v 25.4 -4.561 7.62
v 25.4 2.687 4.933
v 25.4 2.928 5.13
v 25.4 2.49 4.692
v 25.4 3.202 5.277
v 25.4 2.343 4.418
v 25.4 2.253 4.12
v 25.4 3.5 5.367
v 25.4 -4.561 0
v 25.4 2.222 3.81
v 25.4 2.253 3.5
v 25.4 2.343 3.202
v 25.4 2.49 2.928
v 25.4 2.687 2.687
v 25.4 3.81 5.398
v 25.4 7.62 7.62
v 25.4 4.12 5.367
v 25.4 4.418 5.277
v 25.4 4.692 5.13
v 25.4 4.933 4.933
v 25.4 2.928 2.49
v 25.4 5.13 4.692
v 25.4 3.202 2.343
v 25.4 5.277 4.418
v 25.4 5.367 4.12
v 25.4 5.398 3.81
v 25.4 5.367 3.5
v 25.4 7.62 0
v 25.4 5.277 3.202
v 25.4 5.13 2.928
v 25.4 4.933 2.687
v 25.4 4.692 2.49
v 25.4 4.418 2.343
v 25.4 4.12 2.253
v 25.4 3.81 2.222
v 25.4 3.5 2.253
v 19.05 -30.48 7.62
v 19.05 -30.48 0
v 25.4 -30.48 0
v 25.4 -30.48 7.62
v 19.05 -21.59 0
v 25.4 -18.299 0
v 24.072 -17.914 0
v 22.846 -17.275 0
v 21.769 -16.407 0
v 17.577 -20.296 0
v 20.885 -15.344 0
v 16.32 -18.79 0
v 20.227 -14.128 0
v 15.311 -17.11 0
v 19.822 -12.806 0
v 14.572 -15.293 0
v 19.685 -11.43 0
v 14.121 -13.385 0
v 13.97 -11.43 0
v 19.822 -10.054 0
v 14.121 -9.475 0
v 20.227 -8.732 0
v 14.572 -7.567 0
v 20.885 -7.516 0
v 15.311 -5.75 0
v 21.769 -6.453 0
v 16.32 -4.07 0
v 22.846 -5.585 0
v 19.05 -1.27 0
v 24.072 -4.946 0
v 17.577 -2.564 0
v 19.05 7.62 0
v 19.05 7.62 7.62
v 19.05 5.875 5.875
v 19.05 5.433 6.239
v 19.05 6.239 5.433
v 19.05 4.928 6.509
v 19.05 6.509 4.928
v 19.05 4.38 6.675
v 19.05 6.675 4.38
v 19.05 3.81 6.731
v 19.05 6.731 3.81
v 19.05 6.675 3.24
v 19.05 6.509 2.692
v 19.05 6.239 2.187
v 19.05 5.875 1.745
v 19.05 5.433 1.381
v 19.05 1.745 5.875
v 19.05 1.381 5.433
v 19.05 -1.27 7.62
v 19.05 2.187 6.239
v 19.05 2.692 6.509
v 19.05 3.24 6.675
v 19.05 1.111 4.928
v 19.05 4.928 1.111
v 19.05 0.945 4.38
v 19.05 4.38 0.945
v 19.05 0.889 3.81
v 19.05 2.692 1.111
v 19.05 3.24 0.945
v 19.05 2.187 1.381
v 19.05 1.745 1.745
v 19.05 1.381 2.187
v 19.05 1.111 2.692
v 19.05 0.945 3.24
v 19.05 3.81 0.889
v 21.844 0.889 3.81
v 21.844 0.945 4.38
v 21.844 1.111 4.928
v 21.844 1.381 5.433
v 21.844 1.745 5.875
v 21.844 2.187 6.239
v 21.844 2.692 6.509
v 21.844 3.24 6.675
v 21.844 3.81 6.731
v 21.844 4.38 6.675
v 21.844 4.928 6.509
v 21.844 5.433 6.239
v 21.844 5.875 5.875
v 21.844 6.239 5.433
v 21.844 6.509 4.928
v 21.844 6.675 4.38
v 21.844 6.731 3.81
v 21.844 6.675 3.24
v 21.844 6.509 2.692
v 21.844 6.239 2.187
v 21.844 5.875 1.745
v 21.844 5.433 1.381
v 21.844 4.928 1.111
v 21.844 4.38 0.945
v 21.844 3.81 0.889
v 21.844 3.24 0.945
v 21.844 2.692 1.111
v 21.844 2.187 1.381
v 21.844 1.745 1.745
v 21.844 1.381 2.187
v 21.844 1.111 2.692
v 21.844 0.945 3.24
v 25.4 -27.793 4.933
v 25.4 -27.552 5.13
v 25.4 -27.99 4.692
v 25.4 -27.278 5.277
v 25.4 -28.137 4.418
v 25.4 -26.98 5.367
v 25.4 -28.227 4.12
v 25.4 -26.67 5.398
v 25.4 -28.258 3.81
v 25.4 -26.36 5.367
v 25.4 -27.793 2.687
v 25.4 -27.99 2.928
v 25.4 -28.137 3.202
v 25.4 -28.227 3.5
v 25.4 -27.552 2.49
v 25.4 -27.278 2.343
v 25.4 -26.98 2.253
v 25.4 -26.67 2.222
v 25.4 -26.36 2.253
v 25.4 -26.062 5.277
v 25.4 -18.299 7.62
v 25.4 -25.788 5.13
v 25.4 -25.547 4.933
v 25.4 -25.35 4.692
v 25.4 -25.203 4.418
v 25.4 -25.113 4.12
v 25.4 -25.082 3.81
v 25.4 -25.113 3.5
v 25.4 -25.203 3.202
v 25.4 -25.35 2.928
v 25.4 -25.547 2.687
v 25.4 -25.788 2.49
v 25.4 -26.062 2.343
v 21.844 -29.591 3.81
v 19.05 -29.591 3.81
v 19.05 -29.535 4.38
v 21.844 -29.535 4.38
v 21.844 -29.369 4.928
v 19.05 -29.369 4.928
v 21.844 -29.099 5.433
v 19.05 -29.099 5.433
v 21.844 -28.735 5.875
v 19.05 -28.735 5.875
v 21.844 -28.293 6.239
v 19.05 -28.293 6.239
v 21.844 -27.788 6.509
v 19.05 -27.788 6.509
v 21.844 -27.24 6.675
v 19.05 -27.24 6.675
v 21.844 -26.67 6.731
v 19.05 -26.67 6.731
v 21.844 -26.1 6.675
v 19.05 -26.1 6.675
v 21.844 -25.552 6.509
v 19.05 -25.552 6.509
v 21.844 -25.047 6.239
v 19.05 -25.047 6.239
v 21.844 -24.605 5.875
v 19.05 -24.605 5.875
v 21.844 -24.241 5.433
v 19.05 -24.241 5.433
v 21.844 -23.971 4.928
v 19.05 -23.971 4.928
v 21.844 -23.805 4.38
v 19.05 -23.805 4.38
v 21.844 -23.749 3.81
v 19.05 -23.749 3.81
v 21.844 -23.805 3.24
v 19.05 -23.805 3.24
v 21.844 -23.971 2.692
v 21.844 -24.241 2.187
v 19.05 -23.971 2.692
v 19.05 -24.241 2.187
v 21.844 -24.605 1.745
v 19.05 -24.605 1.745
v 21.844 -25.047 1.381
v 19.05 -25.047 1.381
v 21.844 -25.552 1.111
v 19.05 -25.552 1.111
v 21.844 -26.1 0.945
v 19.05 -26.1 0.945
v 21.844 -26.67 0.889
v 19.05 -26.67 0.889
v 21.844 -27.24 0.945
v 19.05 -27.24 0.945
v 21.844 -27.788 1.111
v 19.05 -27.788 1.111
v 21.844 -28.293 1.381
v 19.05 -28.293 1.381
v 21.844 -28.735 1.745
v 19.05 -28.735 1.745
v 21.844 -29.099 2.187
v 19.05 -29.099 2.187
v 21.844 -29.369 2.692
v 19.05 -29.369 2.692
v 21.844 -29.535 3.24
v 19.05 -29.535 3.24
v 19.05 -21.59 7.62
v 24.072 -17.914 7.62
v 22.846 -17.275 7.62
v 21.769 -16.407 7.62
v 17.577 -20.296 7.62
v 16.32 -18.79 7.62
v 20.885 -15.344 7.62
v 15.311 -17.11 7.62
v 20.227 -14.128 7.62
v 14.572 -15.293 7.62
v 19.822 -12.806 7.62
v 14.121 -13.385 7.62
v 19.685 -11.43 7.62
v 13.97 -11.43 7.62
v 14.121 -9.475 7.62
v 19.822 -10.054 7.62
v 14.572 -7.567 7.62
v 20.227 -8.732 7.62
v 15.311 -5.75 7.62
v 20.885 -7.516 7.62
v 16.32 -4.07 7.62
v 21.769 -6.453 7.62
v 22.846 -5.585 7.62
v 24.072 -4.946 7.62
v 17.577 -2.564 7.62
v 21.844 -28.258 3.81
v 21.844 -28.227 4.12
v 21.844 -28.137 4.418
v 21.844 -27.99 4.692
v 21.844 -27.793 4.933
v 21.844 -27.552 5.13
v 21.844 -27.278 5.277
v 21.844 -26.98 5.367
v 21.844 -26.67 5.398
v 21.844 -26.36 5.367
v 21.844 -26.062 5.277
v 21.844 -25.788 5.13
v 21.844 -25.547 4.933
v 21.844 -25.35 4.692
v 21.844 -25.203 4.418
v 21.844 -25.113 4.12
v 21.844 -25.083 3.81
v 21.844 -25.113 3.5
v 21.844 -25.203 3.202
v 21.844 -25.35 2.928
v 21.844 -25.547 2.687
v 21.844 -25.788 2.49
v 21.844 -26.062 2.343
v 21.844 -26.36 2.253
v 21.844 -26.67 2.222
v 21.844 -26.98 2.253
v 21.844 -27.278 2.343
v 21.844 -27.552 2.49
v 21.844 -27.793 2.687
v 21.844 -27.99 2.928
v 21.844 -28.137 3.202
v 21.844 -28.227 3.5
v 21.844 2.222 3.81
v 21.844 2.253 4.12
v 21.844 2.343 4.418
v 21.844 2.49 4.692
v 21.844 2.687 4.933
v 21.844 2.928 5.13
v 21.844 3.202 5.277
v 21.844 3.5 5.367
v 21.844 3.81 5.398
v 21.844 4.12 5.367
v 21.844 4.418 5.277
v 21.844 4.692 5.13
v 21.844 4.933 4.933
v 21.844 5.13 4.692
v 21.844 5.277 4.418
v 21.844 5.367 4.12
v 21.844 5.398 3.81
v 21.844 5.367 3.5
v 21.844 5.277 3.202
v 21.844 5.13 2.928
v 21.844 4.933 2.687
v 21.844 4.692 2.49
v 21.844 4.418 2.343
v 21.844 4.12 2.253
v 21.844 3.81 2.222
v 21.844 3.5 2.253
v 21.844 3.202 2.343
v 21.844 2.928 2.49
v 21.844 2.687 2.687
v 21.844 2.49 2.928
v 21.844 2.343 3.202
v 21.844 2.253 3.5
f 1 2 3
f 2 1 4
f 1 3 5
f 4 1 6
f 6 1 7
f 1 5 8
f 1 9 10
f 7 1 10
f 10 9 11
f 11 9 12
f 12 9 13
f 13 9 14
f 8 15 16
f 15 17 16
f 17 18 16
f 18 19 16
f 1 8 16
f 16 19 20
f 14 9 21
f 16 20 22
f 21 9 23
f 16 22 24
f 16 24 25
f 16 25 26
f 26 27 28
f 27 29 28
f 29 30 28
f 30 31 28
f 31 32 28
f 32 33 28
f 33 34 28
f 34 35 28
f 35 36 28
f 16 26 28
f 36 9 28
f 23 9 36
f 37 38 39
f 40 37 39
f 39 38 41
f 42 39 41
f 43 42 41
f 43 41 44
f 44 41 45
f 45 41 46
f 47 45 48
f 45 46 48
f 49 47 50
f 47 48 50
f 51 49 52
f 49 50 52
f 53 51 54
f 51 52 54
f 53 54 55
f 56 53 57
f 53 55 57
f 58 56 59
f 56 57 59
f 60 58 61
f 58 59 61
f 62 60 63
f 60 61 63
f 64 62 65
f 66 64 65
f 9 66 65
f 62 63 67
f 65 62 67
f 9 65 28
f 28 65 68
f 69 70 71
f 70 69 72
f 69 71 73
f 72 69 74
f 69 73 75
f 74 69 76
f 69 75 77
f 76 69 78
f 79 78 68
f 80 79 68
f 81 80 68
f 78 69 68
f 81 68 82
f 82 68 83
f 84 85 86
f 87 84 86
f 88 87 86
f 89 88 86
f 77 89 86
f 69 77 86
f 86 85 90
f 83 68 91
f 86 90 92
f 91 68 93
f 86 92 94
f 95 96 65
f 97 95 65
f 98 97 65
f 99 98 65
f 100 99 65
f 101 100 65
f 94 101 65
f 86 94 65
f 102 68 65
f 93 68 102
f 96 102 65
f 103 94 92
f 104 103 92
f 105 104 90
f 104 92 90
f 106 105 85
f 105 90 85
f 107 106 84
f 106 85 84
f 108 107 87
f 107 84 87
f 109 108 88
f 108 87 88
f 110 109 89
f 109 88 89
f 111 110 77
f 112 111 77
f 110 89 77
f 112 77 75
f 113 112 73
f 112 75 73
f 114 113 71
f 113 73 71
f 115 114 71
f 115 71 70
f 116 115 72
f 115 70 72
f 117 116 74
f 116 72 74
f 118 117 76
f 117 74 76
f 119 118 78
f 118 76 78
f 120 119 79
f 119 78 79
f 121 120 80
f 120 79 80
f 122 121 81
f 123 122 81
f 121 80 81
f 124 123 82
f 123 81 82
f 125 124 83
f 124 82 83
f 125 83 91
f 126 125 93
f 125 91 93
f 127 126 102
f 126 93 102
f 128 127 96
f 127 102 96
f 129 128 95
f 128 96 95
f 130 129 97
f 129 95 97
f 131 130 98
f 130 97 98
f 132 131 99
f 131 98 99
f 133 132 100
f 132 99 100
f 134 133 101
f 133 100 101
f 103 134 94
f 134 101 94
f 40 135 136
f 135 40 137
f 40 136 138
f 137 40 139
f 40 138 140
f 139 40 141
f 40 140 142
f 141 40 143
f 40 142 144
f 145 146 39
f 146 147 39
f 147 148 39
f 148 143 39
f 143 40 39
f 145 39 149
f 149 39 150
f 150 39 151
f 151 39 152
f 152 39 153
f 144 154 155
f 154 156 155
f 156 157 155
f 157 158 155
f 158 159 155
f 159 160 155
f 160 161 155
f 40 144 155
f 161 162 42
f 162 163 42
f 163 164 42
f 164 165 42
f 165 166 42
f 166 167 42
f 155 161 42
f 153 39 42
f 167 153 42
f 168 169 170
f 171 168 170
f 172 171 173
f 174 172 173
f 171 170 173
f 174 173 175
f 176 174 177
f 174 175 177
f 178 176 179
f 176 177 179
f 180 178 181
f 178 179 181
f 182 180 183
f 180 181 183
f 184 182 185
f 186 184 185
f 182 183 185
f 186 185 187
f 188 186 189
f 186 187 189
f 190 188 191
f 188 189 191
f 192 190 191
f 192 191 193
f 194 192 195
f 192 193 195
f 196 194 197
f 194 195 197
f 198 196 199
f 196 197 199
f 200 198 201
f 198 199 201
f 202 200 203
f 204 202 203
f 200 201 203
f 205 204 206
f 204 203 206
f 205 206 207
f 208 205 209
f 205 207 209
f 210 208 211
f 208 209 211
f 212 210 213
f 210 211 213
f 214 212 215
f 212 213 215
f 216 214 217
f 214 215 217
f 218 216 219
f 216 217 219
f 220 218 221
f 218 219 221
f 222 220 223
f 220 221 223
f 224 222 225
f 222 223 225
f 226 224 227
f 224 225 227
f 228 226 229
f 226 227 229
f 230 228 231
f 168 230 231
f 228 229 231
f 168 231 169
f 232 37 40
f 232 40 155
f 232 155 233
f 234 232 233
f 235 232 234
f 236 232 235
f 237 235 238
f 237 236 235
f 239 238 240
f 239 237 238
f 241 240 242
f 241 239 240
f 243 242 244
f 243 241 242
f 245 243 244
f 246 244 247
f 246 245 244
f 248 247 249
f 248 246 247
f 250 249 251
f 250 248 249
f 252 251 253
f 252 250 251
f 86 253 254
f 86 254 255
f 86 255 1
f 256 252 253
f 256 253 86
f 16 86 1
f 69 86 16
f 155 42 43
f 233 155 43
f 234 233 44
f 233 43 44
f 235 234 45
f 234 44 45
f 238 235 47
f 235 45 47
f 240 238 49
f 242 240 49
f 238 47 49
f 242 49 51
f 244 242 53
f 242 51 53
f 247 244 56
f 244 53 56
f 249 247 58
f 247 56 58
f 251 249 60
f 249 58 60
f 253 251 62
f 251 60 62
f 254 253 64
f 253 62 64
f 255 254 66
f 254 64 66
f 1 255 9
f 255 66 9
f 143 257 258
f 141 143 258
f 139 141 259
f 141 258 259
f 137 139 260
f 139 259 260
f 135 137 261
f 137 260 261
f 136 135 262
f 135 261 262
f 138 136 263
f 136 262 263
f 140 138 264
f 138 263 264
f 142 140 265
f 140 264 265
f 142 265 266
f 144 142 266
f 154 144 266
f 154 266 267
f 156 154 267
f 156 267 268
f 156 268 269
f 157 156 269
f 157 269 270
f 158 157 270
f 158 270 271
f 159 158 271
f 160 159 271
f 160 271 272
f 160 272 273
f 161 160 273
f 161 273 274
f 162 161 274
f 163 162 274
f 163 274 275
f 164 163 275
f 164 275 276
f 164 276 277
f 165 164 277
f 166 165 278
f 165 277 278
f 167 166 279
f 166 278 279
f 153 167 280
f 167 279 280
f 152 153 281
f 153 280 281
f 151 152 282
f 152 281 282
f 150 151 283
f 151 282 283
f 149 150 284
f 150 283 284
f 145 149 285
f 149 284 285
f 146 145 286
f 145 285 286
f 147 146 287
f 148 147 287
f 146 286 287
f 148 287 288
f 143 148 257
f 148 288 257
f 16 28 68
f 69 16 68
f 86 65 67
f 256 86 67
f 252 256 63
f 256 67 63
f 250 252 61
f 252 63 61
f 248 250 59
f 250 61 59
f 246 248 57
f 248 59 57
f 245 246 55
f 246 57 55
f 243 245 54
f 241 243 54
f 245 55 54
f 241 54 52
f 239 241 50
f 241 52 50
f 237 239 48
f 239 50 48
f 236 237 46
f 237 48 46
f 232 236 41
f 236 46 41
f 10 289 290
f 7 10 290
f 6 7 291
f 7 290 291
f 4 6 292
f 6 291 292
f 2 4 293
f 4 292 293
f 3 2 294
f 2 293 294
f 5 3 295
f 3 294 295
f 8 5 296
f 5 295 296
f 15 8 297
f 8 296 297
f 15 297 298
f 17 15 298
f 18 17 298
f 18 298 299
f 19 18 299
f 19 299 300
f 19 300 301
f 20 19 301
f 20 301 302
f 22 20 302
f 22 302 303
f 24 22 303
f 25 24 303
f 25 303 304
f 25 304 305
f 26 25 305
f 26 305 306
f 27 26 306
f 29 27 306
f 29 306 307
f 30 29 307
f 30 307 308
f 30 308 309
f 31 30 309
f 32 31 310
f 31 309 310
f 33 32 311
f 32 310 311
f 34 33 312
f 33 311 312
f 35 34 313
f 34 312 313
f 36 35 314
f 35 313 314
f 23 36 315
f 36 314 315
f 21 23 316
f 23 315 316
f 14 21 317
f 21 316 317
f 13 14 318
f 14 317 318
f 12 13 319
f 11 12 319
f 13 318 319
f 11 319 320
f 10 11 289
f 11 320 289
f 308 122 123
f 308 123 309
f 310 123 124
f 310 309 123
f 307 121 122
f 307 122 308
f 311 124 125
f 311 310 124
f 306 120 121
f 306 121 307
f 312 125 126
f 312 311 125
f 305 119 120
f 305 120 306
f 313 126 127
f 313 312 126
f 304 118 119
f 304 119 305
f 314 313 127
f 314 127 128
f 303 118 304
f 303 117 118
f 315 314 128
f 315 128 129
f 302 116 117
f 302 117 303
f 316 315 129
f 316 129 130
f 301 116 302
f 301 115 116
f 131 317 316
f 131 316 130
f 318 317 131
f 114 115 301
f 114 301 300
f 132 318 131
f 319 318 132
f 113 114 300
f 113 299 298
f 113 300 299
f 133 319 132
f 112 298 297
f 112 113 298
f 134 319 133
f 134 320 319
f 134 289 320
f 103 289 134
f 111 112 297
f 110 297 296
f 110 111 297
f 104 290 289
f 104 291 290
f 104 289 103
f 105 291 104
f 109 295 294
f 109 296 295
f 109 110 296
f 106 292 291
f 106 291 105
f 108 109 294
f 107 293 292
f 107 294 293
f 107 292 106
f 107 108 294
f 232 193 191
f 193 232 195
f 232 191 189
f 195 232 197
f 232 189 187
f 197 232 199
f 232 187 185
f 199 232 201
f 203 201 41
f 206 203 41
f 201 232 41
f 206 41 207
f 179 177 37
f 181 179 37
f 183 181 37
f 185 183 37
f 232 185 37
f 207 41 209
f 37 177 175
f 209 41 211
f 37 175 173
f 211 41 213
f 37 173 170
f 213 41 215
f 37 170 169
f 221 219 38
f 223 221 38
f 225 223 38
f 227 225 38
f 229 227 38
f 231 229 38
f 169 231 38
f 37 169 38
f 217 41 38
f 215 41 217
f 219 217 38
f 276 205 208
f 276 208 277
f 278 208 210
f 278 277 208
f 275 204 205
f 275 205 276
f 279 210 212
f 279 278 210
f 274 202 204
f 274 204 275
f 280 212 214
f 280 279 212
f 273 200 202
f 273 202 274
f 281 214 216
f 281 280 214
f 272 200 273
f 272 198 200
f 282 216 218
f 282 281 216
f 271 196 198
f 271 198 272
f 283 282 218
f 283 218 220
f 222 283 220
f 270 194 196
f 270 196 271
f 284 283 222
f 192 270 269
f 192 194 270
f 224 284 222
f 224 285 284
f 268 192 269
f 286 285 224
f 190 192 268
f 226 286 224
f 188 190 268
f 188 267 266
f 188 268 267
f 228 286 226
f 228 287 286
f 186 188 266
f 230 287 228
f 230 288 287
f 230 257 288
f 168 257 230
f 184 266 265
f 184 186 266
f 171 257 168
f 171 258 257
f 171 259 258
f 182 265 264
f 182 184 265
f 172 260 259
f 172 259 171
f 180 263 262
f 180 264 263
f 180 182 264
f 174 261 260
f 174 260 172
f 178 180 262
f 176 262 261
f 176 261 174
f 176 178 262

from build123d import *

# Parameters (mm, degrees)
F1_DEPTH = 7.62
F2_R     = 1.5875
F3_R     = 1.5875
F4_DEPTH = 25.4
F2_R_2   = 2.921
F3_R_2   = 2.921
F5_DEPTH = 2.794
F6_ANGLE = -90


with BuildPart() as f1:
    # F0 (on Top) → F1 (new body)
    with BuildSketch(Plane.XY):
        with BuildLine():
            Line((11.43, 1.27), (12.6363404513, 1.27))
            ThreePointArc((12.6363404513, 1.27), (12.2207385876, 3.4559439194), (11.43, 5.5358016583))
            Line((11.43, 5.5358016583), (11.43, 1.27))
        make_face()
        with BuildLine():
            ThreePointArc((11.43, 5.5358016583), (12.2207385876, 3.4559439194), (12.6363404513, 1.27))
            Line((12.6363404513, 1.27), (19.05, 1.27))
            Line((19.05, 1.27), (19.05, 7.62))
            Line((19.05, 7.62), (11.43, 7.62))
            Line((11.43, 7.62), (11.43, 5.5358016583))
        make_face()
        with BuildLine():
            Line((11.43, 1.27), (11.43, 5.5358016583))
            ThreePointArc((11.43, 5.5358016583), (10.8451830635, 6.6084797282), (10.16, 7.62))
            Line((10.16, 7.62), (-10.16, 7.62))
            ThreePointArc((-10.16, 7.62), (-10.8451830635, 6.6084797282), (-11.43, 5.5358016583))
            Line((-11.43, 5.5358016583), (-11.43, 1.27))
            Line((-11.43, 1.27), (-6.8685751798, 1.27))
            ThreePointArc((-6.8685751798, 1.27), (0, 6.985), (6.8685751798, 1.27))
            Line((6.8685751798, 1.27), (11.43, 1.27))
        make_face()
        with BuildLine():
            ThreePointArc((10.16, 7.62), (10.8451830635, 6.6084797282), (11.43, 5.5358016583))
            Line((11.43, 5.5358016583), (11.43, 7.62))
            Line((11.43, 7.62), (10.16, 7.62))
        make_face()
        with BuildLine():
            Line((-10.16, 7.62), (10.16, 7.62))
            ThreePointArc((10.16, 7.62), (0, 12.7), (-10.16, 7.62))
        make_face()
        with BuildLine():
            ThreePointArc((-11.43, 5.5358016583), (-10.8451830635, 6.6084797282), (-10.16, 7.62))
            Line((-10.16, 7.62), (-11.43, 7.62))
            Line((-11.43, 7.62), (-11.43, 5.5358016583))
        make_face()
        with BuildLine():
            Line((-11.43, 1.27), (-11.43, 5.5358016583))
            ThreePointArc((-11.43, 5.5358016583), (-12.2207385876, 3.4559439194), (-12.6363404513, 1.27))
            Line((-12.6363404513, 1.27), (-11.43, 1.27))
        make_face()
        with BuildLine():
            ThreePointArc((-12.6363404513, 1.27), (-12.2207385876, 3.4559439194), (-11.43, 5.5358016583))
            Line((-11.43, 5.5358016583), (-11.43, 7.62))
            Line((-11.43, 7.62), (-19.05, 7.62))
            Line((-19.05, 7.62), (-19.05, 1.27))
            Line((-19.05, 1.27), (-12.6363404513, 1.27))
        make_face()
    extrude(amount=F1_DEPTH)

    # F2 (on face) + F3 (on face) → F4 (cut)
    with BuildSketch(Plane(origin=(0, 7.62, 0), x_dir=(-1, 0, 0), z_dir=(0, 1, 0))):
        with Locations((-15.24, 3.81)):
            Circle(F2_R)
    with BuildSketch(Plane(origin=(0, 7.62, 0), x_dir=(-1, 0, 0), z_dir=(0, 1, 0))):
        with Locations((15.24, 3.81)):
            Circle(F3_R)
    extrude(amount=-F4_DEPTH, mode=Mode.SUBTRACT)

    # F2 (on face) + F3 (on face) → F5 (cut)
    with BuildSketch(Plane(origin=(0, 7.62, 0), x_dir=(-1, 0, 0), z_dir=(0, 1, 0))):
        with Locations((-15.24, 3.81)):
            Circle(F2_R_2)
        with Locations((-15.24, 3.81)):
            Circle(F2_R, mode=Mode.SUBTRACT)
    with BuildSketch(Plane(origin=(0, 7.62, 0), x_dir=(-1, 0, 0), z_dir=(0, 1, 0))):
        with Locations((15.24, 3.81)):
            Circle(F3_R_2)
        with Locations((15.24, 3.81)):
            Circle(F3_R, mode=Mode.SUBTRACT)
    extrude(amount=-F5_DEPTH, mode=Mode.SUBTRACT)


with BuildPart() as f1_1:
    # F6: moved
    add(f1.part.rotate(Axis((19.05, 7.62, 3.81), (0, 0, -1)), F6_ANGLE))


solid = f1_1.part
